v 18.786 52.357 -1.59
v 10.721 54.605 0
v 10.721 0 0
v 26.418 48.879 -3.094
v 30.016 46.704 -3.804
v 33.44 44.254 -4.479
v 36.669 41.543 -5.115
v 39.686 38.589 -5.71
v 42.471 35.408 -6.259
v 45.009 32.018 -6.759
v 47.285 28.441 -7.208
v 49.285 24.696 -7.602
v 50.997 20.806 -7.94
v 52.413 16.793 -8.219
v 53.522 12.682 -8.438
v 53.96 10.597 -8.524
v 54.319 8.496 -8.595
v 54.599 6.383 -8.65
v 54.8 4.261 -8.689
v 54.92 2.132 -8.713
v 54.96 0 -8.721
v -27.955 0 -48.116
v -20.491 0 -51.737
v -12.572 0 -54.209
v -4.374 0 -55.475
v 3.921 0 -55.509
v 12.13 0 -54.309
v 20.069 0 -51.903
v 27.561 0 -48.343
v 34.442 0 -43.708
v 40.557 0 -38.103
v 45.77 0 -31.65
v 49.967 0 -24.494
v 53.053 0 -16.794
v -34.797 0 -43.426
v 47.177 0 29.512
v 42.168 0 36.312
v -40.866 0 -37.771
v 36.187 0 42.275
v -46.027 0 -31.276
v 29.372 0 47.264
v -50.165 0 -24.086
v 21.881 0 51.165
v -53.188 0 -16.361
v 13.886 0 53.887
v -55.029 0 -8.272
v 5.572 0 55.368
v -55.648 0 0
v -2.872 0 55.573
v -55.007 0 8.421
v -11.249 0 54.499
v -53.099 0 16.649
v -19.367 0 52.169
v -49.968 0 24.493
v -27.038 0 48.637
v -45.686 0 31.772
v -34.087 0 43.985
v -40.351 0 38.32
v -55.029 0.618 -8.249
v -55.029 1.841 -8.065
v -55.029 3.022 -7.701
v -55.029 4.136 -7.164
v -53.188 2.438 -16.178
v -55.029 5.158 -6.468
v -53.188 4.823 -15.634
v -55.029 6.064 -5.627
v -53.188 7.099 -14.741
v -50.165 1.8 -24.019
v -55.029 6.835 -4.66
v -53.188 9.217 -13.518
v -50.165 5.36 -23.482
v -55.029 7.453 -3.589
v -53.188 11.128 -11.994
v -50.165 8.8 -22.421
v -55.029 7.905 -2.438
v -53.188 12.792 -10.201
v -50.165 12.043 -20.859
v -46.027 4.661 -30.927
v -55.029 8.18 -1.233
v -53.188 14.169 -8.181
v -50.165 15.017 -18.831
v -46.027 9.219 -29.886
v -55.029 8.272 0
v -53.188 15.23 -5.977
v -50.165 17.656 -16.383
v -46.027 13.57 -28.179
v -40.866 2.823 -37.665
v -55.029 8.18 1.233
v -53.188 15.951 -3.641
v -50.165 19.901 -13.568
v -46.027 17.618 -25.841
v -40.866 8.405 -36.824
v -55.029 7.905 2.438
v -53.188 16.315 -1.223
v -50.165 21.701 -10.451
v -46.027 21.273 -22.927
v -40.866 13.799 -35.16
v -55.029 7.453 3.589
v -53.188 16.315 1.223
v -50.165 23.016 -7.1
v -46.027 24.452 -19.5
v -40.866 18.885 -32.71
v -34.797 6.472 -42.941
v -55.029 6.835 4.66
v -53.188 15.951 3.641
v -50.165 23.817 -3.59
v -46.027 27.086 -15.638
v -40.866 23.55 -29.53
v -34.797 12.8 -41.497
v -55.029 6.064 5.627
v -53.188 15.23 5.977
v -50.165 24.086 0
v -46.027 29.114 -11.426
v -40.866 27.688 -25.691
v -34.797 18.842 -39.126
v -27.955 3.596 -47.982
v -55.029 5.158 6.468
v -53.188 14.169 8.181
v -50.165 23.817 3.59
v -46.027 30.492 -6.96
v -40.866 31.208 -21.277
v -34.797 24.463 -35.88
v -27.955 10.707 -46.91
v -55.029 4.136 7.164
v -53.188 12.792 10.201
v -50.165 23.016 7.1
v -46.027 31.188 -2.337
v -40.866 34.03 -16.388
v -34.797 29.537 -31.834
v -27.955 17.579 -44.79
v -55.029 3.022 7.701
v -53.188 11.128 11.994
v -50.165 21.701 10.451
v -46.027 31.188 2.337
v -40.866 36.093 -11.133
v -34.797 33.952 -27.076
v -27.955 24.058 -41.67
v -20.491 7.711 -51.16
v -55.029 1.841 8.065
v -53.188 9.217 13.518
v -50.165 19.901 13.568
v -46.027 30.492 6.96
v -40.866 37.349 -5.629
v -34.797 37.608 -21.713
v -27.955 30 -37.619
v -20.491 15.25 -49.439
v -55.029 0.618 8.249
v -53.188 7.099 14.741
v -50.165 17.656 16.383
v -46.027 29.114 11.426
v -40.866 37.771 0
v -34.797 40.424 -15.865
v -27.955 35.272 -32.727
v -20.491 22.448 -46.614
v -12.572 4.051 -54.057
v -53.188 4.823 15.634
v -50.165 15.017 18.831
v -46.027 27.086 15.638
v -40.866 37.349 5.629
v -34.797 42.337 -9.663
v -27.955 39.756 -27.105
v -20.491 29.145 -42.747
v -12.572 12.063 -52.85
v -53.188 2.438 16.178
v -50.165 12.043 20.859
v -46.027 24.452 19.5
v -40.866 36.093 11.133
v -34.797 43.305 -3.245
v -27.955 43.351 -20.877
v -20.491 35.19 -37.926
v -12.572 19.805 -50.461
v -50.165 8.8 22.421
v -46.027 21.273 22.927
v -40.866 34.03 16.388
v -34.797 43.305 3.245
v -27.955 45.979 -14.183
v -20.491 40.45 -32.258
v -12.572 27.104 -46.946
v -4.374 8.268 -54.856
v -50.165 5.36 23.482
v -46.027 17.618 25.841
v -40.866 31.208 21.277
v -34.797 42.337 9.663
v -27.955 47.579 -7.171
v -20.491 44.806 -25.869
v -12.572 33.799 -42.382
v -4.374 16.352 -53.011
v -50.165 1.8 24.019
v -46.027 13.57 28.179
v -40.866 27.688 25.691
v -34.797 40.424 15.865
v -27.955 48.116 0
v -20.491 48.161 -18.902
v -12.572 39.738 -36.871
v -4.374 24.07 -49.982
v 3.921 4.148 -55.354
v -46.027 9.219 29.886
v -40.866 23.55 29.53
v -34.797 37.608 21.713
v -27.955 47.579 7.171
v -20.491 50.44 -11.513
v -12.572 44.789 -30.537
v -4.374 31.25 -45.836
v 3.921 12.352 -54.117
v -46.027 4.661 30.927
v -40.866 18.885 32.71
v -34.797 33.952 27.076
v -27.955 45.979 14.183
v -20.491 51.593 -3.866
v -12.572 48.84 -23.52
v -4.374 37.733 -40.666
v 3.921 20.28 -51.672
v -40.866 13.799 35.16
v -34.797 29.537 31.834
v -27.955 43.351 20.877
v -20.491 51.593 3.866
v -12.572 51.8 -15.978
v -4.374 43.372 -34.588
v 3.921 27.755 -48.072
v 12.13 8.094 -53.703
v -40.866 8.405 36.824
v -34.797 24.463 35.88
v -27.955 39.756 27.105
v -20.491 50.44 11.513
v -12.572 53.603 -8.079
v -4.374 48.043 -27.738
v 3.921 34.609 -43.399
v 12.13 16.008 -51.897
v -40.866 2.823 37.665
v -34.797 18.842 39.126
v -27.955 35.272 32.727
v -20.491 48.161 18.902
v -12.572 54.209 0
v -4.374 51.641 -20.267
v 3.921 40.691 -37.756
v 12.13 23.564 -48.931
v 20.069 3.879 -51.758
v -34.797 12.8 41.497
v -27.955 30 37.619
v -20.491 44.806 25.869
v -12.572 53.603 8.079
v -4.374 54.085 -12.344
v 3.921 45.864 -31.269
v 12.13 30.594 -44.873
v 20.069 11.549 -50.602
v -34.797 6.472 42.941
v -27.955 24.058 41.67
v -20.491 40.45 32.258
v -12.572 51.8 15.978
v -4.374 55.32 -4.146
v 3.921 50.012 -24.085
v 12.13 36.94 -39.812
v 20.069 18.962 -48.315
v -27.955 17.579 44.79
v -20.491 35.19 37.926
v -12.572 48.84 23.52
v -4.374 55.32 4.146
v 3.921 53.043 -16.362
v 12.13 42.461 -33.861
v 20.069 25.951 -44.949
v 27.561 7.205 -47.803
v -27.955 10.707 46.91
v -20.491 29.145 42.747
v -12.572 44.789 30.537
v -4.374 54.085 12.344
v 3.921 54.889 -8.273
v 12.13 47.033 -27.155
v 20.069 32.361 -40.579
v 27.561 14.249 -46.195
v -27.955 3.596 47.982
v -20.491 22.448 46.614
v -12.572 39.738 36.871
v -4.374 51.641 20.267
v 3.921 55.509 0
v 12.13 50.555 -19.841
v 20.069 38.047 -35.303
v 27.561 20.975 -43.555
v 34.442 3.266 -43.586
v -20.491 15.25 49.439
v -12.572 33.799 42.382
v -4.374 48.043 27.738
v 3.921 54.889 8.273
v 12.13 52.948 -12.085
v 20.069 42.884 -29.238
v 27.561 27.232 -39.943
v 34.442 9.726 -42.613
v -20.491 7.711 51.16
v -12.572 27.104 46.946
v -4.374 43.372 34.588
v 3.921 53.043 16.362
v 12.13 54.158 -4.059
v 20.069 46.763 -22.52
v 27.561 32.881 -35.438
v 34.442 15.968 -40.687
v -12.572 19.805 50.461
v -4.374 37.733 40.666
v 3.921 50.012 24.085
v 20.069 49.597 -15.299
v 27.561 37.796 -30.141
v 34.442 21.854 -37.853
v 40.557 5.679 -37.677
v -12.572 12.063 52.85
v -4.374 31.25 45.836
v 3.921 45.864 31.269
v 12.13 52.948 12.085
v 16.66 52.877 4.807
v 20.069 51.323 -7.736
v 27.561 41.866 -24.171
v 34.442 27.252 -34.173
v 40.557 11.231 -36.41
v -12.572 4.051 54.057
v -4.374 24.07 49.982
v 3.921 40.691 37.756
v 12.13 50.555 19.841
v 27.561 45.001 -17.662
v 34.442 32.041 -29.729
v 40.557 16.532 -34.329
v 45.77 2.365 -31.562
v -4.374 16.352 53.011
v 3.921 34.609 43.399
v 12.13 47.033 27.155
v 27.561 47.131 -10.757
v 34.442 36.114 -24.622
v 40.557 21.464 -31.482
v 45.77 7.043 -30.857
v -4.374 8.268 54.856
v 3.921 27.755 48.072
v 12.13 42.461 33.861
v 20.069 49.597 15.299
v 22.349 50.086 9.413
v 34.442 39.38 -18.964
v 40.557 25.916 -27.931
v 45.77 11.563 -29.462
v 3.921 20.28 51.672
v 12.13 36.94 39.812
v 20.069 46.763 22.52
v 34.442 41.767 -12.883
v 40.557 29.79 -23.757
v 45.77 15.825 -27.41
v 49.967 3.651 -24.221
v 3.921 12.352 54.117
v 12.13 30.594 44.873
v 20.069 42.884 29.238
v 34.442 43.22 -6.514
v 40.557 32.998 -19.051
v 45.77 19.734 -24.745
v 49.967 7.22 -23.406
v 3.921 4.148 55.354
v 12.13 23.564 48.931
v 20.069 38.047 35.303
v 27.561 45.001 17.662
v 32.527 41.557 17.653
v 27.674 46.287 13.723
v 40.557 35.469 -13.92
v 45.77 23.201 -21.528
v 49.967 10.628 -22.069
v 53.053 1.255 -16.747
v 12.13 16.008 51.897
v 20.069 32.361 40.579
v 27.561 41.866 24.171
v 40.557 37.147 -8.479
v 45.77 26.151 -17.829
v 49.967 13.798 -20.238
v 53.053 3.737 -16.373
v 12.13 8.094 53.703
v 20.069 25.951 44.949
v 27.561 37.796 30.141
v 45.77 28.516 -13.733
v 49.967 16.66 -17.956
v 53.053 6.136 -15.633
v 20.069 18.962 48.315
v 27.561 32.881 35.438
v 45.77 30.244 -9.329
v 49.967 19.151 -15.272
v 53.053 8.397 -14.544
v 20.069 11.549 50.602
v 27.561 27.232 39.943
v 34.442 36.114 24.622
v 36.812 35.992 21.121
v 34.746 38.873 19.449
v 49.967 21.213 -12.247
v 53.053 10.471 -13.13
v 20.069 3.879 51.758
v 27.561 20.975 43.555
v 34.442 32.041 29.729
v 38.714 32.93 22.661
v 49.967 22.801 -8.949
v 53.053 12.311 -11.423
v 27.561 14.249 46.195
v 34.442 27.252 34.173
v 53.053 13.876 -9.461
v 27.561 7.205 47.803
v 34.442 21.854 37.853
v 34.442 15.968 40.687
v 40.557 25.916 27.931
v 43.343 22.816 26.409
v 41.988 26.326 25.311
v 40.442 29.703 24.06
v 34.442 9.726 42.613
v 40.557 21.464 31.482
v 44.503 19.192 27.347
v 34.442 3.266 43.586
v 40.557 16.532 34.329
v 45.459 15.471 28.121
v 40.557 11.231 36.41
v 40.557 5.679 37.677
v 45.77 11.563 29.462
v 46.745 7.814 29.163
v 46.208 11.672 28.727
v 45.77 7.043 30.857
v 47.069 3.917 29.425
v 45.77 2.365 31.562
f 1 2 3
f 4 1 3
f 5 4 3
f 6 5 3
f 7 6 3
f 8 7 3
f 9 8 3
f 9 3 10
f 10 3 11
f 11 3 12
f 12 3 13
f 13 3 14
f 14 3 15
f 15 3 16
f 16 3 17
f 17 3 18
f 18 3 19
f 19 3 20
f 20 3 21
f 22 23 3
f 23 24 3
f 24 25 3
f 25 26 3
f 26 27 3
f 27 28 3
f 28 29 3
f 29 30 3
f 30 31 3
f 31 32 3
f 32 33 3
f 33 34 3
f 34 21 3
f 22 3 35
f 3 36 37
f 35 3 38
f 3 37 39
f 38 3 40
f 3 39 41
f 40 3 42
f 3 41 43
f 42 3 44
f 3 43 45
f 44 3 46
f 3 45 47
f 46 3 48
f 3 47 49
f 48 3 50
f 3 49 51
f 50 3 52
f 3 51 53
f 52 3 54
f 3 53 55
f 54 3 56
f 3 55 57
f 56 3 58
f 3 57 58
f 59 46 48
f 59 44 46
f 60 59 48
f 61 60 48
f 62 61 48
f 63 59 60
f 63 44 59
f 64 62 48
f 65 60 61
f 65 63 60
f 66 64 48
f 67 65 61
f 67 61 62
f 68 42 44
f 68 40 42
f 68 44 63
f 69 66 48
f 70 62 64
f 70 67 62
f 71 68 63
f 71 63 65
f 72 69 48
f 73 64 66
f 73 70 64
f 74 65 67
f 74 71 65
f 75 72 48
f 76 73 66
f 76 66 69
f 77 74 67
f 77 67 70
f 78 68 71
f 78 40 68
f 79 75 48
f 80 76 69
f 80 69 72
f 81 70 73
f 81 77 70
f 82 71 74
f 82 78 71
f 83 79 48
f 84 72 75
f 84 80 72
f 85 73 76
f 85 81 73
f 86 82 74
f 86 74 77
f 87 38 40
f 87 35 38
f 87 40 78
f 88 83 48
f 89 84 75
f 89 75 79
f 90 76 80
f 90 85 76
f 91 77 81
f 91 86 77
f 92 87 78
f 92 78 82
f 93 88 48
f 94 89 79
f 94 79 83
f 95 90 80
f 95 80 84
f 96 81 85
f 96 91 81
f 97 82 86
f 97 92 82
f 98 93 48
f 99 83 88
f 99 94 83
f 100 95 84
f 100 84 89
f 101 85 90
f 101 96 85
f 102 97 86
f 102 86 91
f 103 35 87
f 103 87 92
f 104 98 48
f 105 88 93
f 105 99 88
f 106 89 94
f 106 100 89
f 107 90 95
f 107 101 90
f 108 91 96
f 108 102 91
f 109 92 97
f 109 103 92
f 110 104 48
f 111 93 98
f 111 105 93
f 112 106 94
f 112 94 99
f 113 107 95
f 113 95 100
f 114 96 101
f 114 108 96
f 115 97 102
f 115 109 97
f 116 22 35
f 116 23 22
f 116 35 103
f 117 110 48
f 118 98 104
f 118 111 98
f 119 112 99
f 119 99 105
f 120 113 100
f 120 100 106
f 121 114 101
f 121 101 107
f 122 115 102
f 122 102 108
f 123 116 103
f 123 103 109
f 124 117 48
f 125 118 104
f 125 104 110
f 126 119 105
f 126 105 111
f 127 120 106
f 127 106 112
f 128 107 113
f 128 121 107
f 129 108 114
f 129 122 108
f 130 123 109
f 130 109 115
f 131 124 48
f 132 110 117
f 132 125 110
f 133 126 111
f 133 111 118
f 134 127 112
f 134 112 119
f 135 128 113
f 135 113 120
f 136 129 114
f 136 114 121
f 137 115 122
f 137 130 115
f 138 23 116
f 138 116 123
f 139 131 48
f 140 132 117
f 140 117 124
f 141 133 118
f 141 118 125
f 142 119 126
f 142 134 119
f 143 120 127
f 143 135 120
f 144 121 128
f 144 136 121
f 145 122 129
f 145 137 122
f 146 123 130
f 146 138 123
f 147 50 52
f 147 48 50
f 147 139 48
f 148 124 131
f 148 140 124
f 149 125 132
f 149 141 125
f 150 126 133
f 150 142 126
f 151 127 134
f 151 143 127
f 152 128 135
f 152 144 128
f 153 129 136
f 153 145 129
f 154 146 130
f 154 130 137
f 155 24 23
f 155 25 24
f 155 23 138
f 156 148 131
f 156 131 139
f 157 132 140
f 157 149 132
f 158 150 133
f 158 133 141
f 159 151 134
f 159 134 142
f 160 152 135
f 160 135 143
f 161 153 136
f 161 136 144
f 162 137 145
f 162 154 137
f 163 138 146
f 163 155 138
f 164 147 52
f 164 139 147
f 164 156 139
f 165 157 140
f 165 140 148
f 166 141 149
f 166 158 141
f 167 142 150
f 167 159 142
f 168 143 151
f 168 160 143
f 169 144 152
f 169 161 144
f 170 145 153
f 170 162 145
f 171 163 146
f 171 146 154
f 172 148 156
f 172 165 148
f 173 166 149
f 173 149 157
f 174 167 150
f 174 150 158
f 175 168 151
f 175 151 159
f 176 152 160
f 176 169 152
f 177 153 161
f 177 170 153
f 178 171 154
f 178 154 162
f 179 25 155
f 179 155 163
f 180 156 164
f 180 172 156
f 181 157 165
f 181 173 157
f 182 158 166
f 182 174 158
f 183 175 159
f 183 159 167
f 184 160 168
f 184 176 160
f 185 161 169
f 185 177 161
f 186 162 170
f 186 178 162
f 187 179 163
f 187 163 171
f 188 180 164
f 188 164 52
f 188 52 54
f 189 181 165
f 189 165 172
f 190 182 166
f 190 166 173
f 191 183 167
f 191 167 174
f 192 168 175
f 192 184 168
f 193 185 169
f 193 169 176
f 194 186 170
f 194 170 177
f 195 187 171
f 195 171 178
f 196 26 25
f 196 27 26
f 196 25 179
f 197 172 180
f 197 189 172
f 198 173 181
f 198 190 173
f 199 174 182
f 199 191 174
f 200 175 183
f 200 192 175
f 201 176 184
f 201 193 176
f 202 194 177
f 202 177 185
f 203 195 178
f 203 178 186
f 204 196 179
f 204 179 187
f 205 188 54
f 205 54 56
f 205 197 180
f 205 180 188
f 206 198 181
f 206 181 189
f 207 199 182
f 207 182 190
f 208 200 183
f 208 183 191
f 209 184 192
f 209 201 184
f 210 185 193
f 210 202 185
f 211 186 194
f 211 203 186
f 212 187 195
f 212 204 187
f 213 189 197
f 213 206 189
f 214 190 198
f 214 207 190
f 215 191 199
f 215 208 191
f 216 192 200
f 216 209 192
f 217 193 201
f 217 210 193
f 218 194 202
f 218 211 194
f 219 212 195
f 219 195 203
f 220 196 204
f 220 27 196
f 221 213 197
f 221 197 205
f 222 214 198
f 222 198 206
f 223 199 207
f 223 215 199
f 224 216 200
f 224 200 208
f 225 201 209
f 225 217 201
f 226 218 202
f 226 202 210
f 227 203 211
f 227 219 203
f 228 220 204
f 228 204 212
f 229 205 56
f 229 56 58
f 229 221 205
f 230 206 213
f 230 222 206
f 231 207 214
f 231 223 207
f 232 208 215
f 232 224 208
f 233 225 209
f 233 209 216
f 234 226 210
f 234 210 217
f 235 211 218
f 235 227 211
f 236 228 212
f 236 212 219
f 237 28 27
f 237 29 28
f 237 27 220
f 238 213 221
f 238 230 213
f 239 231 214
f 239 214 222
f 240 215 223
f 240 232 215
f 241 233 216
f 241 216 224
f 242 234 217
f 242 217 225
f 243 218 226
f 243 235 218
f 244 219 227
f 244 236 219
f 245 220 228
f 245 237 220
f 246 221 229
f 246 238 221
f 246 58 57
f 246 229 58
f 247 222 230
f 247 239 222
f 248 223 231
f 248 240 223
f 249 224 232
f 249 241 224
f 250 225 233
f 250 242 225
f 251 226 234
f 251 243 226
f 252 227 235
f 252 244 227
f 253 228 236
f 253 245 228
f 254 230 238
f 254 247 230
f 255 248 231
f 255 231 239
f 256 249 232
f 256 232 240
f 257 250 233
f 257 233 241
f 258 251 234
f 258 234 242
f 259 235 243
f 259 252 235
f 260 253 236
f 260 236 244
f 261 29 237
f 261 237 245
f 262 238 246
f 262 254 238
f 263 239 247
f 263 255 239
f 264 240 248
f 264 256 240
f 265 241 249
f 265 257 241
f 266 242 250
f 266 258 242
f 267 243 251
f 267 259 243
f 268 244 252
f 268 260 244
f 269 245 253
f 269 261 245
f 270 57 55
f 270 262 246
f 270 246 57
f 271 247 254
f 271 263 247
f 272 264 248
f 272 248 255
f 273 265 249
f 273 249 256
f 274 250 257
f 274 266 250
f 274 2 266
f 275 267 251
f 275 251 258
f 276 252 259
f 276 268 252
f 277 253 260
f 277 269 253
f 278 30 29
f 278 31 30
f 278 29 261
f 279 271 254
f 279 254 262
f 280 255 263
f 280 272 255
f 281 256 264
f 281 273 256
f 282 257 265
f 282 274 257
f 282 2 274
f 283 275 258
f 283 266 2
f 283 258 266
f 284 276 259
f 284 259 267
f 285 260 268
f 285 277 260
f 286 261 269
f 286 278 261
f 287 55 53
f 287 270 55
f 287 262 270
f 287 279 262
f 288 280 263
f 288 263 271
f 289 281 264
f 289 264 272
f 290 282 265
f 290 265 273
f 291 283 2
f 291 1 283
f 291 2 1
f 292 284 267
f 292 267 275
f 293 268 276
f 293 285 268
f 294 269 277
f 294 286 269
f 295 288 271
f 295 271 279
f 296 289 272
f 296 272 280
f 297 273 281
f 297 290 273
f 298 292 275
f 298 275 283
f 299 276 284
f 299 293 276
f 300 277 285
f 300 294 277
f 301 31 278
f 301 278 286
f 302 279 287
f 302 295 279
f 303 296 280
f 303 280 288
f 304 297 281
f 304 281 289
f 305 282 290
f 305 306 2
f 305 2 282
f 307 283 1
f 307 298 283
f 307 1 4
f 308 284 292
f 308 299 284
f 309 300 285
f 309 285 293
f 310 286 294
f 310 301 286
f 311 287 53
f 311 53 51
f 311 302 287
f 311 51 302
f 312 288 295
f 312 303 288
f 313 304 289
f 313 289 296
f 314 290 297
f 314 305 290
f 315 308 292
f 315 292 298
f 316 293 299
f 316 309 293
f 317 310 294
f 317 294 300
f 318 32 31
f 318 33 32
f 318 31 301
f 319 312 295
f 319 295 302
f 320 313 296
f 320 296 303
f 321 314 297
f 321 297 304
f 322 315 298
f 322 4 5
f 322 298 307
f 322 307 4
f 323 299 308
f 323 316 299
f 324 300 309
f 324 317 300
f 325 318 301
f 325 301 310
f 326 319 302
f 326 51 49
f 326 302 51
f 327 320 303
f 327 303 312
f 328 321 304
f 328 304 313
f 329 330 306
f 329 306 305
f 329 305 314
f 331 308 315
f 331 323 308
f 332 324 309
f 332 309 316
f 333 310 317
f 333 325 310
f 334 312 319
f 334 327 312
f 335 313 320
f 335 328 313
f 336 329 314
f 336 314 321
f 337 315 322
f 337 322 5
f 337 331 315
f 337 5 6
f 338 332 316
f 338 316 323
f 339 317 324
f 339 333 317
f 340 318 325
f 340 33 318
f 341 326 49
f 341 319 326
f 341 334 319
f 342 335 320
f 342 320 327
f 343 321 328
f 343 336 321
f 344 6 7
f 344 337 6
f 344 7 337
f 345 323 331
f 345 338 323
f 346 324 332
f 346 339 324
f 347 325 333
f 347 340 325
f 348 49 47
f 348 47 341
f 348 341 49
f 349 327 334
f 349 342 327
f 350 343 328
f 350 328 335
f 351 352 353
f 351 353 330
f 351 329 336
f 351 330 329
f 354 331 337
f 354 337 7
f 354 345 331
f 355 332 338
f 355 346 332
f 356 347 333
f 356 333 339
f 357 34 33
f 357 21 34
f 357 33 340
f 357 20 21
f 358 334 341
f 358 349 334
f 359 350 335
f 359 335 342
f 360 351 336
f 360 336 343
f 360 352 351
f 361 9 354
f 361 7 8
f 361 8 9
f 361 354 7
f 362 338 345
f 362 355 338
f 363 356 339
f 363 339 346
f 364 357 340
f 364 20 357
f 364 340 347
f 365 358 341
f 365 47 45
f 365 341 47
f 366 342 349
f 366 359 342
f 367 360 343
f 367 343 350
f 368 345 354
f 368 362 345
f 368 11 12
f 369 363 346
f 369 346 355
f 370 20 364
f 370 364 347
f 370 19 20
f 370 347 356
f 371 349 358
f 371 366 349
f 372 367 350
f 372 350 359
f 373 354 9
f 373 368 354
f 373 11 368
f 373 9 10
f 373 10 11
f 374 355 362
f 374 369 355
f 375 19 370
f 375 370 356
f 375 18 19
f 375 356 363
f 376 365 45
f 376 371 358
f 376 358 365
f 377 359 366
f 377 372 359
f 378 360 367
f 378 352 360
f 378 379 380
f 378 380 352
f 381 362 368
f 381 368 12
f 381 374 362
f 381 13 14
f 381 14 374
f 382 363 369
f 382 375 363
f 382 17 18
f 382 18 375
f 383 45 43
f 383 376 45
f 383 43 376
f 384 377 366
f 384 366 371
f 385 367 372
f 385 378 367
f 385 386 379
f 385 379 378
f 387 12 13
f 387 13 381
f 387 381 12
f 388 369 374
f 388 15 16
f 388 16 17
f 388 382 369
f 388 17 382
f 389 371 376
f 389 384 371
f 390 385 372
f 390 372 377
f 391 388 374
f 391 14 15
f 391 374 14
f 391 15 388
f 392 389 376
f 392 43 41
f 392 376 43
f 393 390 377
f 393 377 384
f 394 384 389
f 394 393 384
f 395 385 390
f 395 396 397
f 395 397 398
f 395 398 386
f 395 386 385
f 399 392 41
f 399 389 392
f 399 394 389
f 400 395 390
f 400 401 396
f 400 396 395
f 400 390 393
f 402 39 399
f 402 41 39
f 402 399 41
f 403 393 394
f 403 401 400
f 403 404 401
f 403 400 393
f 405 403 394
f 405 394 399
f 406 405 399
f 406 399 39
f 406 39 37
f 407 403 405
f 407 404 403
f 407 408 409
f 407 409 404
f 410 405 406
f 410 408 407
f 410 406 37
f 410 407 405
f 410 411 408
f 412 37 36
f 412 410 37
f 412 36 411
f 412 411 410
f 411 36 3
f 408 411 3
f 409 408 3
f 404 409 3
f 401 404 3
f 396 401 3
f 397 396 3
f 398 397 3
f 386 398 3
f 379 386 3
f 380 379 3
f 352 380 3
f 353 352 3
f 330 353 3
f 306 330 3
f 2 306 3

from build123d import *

# Parameters (mm, degrees)
F3_DEPTH      = 55.6485557387
F3_DEPTH_BACK = 55.6485557387
F5_DEPTH      = 55.6485557387
F5_DEPTH_BACK = 55.6485557387


with BuildPart() as f1:
    # F0 (on Front) → F1 (revolve)
    with BuildSketch(Plane.XZ):
        with BuildLine():
            ThreePointArc((-55.6475557387, 0), (0, -55.6475557387), (55.6475557387, 0))
            Line((55.6475557387, 0), (-55.6475557387, 0))
        make_face()
    revolve(axis=Axis((0, 0, 0), (1, 0, 0)))

    # F2 (on Front) → F3 (cut, two sides)
    with BuildSketch(Plane.XZ) as f3_sk:
        Polygon((58.5763789713, 38.7402810156), (10.7213417068, 0), (70.8241611719, -11.8484022096), align=None)
    extrude(amount=-F3_DEPTH, mode=Mode.SUBTRACT)
    extrude(f3_sk.sketch, amount=F3_DEPTH_BACK, mode=Mode.SUBTRACT)

    # F4 (on Top) → F5 (cut, two sides)
    with BuildSketch(Plane.XY) as f5_sk:
        Polygon((71.6229304671, 0), (-63.6352449656, 0), (-62.3039603233, -69.3597495556), (71.6229304671, -69.3597495556), align=None)
    extrude(amount=-F5_DEPTH, mode=Mode.SUBTRACT)
    extrude(f5_sk.sketch, amount=F5_DEPTH_BACK, mode=Mode.SUBTRACT)


solid = f1.part
